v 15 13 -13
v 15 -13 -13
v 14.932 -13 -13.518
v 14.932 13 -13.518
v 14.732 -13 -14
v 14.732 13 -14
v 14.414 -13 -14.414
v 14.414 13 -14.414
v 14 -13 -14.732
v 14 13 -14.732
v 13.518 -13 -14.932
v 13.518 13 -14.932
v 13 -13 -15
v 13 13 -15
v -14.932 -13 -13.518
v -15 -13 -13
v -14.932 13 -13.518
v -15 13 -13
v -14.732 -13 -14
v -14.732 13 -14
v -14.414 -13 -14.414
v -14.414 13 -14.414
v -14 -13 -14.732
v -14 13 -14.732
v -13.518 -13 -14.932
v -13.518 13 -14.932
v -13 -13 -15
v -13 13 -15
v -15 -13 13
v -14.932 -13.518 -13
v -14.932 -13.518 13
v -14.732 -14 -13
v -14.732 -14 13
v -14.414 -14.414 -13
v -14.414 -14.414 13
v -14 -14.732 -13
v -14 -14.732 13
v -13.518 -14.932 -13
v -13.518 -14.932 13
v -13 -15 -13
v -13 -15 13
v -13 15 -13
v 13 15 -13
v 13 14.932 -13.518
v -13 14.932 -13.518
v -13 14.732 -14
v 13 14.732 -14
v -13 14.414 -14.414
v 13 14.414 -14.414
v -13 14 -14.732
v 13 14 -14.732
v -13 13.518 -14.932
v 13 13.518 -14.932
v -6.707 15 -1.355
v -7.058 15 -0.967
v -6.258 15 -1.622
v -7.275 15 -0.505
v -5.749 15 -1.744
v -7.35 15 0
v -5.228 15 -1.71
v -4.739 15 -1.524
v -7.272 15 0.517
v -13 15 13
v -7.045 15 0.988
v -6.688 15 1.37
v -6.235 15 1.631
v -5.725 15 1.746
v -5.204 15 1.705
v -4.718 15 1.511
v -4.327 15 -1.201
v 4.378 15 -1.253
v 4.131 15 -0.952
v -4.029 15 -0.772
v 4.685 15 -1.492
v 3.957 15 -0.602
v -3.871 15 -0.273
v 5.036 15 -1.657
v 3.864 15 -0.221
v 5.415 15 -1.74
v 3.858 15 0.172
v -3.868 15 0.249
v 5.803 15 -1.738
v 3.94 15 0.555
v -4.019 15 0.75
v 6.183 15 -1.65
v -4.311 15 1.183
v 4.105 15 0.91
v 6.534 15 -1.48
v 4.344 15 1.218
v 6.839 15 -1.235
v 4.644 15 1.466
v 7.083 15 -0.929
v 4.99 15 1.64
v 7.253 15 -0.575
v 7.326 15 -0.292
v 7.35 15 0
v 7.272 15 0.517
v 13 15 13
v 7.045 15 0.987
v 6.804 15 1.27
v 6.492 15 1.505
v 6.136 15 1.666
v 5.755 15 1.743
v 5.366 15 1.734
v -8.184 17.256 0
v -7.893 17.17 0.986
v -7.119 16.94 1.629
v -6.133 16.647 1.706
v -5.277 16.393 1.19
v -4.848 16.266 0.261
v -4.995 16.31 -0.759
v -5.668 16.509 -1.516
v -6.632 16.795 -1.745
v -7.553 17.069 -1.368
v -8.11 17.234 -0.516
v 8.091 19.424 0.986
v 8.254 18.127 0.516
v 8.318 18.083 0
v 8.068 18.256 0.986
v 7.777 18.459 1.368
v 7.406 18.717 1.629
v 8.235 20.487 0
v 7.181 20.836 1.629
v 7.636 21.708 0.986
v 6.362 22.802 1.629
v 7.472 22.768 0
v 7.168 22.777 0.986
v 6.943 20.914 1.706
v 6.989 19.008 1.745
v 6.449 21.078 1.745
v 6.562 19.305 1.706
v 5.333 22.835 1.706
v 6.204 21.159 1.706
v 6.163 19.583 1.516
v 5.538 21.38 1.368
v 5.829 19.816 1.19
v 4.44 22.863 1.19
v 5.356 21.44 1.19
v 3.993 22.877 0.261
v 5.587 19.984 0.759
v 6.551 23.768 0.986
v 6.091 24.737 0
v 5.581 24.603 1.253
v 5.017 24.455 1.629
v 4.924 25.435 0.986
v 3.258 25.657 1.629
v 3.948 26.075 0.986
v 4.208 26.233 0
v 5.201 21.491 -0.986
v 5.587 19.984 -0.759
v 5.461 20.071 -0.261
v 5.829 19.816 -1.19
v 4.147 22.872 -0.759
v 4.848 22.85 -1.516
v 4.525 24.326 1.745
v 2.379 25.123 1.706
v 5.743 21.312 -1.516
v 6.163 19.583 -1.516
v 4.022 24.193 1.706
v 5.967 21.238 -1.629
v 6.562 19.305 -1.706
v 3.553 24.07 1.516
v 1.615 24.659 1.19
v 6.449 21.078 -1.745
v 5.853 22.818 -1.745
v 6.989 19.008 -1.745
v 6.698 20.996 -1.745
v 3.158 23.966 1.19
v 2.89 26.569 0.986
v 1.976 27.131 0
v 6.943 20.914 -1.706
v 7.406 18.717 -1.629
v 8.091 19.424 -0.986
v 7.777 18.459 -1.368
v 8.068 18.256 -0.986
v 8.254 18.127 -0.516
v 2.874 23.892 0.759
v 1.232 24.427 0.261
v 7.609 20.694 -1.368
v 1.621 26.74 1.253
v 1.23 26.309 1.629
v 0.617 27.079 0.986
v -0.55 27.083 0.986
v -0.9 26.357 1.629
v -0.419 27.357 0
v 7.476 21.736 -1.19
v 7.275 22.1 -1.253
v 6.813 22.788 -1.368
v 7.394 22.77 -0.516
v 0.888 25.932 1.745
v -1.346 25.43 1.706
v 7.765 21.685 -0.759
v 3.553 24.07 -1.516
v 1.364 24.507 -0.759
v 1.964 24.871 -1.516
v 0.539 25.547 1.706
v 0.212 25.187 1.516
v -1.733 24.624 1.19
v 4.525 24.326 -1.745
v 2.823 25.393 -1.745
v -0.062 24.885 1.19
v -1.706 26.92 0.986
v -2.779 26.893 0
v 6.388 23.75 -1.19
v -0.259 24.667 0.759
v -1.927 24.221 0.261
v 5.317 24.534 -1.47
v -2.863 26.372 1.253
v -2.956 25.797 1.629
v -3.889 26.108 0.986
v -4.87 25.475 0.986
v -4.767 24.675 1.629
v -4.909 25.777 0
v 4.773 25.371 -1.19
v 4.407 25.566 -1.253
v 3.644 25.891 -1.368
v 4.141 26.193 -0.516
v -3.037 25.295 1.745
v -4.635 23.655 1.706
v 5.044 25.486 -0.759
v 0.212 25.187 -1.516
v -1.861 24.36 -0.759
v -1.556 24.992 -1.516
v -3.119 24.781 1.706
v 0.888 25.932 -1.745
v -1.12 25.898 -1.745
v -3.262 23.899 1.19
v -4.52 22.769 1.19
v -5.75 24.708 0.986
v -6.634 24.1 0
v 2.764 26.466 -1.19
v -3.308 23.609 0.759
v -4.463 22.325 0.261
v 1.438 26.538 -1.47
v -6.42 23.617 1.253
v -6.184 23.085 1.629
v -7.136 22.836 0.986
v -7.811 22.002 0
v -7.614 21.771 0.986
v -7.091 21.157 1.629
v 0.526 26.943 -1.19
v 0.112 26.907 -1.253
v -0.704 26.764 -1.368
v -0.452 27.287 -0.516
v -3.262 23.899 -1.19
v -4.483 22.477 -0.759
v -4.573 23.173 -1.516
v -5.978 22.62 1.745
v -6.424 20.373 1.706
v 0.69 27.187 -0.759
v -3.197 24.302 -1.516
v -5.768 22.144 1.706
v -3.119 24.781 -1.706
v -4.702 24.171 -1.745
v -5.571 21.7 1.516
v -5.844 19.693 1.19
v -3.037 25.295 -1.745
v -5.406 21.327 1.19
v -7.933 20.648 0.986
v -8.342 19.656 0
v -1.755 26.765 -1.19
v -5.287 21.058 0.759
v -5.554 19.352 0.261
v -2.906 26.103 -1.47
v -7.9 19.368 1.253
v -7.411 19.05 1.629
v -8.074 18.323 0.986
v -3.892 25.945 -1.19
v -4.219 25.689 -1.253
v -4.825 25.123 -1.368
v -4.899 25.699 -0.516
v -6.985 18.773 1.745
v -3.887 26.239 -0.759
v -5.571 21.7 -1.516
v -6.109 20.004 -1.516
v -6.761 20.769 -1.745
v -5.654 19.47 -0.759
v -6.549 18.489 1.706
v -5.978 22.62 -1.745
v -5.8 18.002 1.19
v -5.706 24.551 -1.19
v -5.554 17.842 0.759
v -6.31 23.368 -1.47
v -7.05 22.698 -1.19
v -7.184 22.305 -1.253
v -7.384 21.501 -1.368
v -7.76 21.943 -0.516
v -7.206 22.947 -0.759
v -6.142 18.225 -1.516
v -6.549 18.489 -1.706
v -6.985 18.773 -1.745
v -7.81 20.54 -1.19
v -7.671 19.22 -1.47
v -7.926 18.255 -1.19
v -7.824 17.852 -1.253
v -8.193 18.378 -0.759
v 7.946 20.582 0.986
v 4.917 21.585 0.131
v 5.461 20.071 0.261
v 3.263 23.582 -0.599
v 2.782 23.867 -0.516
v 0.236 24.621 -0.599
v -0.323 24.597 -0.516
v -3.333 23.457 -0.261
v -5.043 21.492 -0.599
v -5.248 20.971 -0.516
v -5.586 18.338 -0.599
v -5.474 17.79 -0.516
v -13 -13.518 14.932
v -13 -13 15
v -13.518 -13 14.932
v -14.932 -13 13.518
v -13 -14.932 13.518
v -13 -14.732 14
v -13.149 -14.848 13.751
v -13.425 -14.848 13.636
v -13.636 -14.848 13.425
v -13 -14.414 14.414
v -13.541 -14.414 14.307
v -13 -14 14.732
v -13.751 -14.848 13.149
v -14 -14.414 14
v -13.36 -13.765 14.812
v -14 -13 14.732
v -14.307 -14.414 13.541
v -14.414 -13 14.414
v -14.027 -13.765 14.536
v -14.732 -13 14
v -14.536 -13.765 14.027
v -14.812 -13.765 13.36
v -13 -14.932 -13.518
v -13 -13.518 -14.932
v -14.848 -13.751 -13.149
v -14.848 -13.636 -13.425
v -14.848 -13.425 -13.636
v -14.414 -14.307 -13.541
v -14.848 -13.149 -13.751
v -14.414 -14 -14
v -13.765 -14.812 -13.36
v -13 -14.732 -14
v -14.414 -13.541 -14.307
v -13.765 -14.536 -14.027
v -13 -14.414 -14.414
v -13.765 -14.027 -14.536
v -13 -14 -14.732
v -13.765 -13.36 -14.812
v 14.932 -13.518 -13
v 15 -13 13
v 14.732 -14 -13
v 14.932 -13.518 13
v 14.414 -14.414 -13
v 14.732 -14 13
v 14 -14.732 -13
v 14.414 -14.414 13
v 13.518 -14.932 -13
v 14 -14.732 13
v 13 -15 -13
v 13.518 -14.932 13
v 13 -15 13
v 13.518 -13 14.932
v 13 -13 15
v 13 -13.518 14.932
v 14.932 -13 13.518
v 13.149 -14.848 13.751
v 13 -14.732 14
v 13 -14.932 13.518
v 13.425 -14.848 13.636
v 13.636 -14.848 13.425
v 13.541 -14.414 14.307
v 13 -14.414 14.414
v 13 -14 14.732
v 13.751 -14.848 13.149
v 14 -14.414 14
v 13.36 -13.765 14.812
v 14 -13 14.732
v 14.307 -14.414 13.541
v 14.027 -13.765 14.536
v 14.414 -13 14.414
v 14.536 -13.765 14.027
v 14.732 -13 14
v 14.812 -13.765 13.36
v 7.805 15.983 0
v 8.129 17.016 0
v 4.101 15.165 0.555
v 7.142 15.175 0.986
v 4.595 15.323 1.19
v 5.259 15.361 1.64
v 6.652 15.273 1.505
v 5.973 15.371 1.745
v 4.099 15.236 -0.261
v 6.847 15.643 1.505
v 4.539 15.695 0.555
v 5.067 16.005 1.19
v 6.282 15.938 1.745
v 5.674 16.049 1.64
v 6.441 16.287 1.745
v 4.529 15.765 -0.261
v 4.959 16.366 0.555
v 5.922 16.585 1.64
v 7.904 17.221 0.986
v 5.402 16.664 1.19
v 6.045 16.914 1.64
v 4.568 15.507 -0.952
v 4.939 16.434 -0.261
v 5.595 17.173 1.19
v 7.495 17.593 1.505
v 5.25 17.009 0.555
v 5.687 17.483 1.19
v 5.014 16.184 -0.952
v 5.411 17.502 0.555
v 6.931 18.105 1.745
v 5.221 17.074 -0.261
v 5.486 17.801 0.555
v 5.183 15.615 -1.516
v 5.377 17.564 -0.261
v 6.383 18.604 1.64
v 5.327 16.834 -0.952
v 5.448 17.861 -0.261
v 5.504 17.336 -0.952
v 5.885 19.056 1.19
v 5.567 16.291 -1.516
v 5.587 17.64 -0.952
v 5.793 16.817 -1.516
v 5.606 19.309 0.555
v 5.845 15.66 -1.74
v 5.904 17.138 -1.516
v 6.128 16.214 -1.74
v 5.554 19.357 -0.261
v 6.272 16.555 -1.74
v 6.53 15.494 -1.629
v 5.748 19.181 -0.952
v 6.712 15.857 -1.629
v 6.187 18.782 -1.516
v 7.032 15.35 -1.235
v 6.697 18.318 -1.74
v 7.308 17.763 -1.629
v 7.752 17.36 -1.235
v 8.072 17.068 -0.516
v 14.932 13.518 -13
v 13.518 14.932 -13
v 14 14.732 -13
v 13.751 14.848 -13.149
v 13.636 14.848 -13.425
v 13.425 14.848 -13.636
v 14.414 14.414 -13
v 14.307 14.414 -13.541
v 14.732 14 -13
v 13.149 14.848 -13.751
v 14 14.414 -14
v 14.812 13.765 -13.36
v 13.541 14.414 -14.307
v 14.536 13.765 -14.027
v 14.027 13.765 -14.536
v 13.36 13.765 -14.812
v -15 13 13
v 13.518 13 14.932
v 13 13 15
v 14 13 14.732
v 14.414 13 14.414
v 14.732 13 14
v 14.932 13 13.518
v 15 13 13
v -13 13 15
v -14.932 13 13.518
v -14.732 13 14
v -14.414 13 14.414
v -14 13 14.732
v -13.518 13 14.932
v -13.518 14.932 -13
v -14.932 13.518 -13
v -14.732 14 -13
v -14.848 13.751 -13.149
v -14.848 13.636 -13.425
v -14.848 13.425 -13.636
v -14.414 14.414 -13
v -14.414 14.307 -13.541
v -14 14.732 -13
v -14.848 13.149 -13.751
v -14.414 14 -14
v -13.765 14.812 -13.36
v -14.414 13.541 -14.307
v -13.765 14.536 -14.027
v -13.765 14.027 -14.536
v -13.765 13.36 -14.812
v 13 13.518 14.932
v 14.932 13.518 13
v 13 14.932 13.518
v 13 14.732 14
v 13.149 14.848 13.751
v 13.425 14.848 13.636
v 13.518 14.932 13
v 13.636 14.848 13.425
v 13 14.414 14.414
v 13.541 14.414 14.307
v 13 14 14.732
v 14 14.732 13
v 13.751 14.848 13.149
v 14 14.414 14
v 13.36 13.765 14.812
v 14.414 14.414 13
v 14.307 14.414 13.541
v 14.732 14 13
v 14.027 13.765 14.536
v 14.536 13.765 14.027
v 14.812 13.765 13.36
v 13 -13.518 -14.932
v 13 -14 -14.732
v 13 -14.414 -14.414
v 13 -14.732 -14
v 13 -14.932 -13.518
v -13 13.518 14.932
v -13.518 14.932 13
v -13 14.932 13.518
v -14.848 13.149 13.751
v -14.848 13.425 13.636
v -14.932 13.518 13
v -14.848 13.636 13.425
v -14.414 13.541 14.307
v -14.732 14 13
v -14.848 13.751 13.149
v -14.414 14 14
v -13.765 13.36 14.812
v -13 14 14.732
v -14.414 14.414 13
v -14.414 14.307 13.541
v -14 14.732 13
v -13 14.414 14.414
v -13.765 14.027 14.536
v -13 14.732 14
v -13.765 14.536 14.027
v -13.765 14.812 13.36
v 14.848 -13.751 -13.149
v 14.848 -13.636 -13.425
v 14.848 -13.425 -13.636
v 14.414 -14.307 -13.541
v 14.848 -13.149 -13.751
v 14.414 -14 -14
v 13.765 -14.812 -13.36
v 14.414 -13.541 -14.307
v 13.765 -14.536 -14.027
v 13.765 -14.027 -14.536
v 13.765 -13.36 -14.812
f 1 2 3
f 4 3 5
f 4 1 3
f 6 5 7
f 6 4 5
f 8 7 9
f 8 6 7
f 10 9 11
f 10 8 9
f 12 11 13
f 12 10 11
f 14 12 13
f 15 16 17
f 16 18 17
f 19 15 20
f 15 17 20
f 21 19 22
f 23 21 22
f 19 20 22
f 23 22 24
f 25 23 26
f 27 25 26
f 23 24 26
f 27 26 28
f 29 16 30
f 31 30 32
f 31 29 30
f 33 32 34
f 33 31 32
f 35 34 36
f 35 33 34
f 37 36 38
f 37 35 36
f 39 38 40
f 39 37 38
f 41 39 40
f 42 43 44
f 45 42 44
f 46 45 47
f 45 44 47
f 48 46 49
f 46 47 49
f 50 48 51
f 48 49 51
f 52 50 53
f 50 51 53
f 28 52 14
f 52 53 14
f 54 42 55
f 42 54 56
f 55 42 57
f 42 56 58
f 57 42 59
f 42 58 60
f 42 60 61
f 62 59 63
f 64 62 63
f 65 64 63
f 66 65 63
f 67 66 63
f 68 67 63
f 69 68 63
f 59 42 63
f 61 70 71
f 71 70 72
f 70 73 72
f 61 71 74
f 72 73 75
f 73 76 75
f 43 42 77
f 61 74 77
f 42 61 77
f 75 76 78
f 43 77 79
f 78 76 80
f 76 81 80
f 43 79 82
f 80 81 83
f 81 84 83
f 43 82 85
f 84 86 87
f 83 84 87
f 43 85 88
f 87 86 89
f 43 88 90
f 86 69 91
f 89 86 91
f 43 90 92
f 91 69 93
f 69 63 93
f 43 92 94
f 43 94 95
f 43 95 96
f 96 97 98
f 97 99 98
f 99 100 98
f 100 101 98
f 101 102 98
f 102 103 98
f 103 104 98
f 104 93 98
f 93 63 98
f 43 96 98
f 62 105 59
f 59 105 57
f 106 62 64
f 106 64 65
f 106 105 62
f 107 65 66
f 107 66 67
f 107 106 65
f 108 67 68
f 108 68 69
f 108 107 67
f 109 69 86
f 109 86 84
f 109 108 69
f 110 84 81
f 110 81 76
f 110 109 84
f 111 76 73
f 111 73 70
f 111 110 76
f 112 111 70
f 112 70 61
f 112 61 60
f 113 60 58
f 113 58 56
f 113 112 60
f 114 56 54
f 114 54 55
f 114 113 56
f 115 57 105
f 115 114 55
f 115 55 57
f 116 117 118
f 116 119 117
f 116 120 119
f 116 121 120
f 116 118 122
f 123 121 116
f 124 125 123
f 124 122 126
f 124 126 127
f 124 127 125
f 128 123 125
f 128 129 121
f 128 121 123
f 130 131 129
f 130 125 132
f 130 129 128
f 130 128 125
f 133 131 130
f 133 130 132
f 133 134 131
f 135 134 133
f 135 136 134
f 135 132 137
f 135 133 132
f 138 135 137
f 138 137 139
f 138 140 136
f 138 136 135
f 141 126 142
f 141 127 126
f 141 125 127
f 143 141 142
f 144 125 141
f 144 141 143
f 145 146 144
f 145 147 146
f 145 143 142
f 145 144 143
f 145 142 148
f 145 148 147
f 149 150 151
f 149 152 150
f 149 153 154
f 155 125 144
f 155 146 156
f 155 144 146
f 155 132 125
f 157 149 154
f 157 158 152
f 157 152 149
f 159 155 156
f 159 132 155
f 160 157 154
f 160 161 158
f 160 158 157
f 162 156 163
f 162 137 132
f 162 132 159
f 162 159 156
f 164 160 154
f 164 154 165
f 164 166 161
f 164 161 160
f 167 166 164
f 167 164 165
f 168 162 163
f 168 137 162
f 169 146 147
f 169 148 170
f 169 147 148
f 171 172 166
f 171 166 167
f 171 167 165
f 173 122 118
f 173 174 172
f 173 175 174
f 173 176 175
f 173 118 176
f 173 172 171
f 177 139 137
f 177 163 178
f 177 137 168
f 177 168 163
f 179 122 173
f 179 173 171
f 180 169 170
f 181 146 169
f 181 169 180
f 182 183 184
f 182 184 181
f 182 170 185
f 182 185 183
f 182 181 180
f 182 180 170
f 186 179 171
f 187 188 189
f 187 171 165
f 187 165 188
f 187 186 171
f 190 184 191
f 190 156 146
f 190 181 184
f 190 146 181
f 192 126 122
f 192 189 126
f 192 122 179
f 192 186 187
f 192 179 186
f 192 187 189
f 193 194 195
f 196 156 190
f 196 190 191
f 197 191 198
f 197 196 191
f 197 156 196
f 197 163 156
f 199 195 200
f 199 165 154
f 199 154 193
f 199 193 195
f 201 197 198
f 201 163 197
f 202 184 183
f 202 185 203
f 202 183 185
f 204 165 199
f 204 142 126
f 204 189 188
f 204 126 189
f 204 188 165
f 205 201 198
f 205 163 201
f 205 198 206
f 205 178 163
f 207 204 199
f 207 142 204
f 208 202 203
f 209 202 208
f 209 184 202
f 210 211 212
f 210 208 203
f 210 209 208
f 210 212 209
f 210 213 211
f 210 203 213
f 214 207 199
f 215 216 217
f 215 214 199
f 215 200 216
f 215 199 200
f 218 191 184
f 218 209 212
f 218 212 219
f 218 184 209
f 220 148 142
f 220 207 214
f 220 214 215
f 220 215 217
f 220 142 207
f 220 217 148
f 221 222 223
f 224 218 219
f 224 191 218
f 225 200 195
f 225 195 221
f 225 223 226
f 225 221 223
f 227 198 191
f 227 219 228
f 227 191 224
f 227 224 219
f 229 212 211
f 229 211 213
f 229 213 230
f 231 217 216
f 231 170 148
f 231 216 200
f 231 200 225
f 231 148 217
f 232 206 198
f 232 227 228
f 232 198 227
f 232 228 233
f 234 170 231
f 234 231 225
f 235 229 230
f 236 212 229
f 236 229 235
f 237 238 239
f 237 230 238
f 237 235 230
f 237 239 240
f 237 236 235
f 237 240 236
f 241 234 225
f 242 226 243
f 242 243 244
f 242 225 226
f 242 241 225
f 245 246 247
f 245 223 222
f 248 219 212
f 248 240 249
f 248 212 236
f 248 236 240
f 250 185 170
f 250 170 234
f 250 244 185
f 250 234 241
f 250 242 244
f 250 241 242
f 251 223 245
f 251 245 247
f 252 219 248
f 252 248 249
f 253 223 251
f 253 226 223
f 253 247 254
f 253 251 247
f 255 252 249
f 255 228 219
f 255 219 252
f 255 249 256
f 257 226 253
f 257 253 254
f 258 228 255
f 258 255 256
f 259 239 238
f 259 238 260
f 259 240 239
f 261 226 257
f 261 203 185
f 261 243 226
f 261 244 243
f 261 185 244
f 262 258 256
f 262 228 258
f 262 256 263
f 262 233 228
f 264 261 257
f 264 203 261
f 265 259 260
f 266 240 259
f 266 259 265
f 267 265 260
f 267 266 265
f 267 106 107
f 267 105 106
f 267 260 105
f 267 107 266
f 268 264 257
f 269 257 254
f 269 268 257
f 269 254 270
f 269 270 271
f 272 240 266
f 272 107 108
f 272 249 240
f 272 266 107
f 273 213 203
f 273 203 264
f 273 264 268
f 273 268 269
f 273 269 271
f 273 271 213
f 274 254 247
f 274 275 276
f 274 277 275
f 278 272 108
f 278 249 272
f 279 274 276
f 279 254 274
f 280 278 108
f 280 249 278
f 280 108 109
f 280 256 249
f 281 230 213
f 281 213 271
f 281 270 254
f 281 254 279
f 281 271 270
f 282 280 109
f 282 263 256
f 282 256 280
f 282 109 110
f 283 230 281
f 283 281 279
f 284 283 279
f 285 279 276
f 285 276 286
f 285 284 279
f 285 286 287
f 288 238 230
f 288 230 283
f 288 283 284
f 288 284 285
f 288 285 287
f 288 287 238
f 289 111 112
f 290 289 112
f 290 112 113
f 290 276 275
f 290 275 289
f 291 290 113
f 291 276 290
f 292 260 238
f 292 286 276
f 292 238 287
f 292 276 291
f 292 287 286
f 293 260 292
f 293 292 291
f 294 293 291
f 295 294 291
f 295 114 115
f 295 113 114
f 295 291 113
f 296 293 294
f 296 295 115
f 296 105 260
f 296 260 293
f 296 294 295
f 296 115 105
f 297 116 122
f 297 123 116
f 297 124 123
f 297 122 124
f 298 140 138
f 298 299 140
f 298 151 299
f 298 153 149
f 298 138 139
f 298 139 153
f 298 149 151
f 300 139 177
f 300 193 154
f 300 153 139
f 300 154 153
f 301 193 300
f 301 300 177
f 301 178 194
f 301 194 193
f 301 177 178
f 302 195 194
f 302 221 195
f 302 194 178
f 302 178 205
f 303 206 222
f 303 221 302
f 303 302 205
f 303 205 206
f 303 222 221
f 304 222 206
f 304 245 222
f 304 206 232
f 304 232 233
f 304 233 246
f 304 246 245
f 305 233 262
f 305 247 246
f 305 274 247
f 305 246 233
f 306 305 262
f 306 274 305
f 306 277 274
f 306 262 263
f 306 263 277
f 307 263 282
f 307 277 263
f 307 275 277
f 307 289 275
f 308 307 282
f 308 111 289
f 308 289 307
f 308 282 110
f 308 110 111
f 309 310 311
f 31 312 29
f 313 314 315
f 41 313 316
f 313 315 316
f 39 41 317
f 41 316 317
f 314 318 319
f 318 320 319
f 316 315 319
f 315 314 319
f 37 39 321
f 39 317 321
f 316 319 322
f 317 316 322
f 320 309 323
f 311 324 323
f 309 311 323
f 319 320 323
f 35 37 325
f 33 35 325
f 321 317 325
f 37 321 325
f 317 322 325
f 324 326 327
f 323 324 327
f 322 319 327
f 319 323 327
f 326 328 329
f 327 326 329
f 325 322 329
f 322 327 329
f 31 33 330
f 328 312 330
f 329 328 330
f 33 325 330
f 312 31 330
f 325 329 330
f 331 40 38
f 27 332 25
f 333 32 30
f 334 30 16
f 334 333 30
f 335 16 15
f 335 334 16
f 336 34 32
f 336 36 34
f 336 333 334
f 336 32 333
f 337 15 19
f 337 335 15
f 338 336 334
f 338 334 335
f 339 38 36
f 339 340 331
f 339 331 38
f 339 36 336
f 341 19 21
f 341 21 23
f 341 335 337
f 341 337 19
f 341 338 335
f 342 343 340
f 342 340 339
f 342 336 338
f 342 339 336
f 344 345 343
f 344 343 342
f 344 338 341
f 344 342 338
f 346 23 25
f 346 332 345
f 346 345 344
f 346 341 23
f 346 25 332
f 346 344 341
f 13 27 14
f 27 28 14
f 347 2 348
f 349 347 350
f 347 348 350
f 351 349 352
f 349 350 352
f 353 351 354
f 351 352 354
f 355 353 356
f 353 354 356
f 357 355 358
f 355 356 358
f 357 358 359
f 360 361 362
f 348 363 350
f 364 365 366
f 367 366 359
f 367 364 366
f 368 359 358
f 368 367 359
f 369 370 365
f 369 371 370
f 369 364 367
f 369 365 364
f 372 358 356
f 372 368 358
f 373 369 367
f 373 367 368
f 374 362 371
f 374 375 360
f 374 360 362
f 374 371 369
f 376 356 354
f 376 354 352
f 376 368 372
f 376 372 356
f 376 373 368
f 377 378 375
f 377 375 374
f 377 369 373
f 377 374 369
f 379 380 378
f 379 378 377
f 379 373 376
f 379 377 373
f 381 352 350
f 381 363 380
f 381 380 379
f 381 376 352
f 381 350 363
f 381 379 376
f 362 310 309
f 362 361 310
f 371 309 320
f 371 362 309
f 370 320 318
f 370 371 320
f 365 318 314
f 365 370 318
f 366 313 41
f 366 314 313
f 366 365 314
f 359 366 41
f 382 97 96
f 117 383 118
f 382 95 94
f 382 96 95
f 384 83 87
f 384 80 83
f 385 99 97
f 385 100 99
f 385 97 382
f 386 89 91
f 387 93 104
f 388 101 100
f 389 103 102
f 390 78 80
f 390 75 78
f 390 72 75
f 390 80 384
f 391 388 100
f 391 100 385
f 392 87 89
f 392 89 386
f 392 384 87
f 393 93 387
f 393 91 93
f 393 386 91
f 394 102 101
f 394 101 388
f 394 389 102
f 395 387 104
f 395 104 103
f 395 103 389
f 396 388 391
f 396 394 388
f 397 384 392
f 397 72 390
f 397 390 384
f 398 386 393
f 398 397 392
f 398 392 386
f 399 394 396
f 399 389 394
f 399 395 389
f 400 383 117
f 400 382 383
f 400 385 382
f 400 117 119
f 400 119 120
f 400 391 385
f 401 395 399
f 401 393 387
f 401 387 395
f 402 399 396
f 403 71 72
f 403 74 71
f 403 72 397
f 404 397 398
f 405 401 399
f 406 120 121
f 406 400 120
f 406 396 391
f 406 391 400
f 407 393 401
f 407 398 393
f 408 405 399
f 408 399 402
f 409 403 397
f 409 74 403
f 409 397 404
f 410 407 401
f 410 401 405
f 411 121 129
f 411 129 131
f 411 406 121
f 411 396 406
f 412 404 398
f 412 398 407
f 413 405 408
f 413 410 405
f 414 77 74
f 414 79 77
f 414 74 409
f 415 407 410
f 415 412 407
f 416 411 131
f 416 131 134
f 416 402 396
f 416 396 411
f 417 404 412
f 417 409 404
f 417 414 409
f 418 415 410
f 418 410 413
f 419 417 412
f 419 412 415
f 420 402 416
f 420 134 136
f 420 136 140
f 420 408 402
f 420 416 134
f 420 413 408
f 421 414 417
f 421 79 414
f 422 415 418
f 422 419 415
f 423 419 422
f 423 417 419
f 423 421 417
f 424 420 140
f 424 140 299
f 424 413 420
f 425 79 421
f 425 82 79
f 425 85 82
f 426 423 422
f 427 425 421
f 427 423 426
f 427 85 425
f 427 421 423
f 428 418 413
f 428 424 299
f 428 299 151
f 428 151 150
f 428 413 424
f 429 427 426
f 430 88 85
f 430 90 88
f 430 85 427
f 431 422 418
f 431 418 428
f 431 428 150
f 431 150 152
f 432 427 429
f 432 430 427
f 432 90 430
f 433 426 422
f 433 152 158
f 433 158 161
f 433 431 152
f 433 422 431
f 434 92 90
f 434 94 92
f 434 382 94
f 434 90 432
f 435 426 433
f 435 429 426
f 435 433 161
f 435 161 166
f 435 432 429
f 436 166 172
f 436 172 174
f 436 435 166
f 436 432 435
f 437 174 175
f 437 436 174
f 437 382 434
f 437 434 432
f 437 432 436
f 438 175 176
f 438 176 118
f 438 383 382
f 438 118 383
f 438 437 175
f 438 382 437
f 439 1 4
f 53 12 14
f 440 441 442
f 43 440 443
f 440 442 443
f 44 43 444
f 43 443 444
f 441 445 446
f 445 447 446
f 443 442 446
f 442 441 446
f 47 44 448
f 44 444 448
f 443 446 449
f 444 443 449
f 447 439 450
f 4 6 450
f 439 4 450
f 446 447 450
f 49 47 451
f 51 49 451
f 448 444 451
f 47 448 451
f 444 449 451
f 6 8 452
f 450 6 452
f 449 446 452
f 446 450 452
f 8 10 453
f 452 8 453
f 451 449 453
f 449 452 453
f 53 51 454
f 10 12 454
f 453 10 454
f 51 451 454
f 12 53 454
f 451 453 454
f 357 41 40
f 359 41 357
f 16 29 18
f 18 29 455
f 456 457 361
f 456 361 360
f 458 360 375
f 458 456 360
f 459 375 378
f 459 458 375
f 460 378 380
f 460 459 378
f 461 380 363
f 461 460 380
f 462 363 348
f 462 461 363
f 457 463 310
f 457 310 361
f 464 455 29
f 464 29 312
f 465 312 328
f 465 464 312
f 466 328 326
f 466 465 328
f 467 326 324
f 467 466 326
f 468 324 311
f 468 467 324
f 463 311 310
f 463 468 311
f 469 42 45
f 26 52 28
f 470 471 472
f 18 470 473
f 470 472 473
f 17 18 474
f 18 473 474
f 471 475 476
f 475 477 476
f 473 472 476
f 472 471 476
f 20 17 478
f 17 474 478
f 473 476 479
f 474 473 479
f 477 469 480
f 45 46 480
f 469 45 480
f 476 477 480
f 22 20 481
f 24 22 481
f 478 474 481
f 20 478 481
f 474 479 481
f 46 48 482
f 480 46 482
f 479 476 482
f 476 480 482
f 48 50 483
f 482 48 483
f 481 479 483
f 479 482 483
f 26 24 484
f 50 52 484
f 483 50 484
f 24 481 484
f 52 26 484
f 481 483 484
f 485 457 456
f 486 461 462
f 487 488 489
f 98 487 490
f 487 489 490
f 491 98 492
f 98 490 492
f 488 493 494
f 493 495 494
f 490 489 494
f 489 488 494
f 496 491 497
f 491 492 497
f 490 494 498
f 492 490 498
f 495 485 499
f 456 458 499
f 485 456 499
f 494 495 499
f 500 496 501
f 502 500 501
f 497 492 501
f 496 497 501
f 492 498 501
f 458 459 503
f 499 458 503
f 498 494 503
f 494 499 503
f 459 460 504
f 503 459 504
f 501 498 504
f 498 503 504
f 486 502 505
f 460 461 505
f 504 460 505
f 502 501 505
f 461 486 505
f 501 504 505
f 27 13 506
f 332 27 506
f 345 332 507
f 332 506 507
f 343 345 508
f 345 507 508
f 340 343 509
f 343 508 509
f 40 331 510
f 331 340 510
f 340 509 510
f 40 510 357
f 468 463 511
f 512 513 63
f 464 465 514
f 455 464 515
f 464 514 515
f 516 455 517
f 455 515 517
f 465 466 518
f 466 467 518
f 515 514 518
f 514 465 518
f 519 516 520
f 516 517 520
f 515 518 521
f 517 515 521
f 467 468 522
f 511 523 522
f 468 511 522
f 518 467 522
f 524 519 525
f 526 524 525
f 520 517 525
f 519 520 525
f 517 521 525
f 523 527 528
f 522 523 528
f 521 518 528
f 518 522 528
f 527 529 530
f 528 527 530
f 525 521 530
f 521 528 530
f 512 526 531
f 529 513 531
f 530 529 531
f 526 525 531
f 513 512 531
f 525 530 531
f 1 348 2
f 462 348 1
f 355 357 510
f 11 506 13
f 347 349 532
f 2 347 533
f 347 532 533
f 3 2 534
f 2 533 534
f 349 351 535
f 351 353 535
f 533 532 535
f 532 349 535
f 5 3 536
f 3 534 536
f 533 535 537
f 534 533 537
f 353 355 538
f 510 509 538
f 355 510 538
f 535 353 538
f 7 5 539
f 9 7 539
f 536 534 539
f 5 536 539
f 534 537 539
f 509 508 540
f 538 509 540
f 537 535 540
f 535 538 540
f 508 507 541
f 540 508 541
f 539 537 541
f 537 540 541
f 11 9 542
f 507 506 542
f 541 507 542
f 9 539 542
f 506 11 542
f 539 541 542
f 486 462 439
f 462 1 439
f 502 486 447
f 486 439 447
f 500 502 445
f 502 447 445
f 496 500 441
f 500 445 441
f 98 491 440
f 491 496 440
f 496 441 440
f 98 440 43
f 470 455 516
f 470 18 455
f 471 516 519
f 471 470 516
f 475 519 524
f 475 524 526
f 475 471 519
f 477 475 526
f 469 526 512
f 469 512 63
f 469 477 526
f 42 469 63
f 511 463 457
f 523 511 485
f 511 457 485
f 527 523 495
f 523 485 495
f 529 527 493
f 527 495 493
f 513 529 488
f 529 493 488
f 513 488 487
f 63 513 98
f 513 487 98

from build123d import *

# Parameters (mm, degrees)
F0_W     = 30
F0_H     = 30
F1_DEPTH = 15
F2_R     = 2
F4_R     = 1.75


with BuildPart() as f1:
    # F0 (on Top) → F1 (new body, symmetric)
    with BuildSketch(Plane.XY):
        Rectangle(F0_W, F0_H)
    extrude(amount=F1_DEPTH, both=True)

    # F2
    f2_edges = [f1.edges().sort_by_distance(p)[0] for p in [
        (15, 0, 15),
        (0, 15, 15),
        (-15, 0, 15),
        (0, -15, 15),
        (0, -15, -15),
        (15, -15, 0),
        (-15, -15, 0),
        (15, 0, -15),
        (15, 15, 0),
        (0, 15, -15),
        (-15, 15, 0),
        (-15, 0, -15),
    ]]
    fillet(f2_edges, radius=F2_R)

    # F5: sweep along a path in F3
    with BuildLine(Plane.XY) as f5_path:
        CenterArc((0, 19), 7, 0, 360)
    # F4 (on face) → F5 (sweep)
    with BuildSketch(Plane(origin=(0, 15, 0), x_dir=(-1, 0, 0), z_dir=(0, 1, 0))):
        with Locations((5.6, 0)):
            Circle(F4_R)
    sweep(path=f5_path.line)


solid = f1.part
